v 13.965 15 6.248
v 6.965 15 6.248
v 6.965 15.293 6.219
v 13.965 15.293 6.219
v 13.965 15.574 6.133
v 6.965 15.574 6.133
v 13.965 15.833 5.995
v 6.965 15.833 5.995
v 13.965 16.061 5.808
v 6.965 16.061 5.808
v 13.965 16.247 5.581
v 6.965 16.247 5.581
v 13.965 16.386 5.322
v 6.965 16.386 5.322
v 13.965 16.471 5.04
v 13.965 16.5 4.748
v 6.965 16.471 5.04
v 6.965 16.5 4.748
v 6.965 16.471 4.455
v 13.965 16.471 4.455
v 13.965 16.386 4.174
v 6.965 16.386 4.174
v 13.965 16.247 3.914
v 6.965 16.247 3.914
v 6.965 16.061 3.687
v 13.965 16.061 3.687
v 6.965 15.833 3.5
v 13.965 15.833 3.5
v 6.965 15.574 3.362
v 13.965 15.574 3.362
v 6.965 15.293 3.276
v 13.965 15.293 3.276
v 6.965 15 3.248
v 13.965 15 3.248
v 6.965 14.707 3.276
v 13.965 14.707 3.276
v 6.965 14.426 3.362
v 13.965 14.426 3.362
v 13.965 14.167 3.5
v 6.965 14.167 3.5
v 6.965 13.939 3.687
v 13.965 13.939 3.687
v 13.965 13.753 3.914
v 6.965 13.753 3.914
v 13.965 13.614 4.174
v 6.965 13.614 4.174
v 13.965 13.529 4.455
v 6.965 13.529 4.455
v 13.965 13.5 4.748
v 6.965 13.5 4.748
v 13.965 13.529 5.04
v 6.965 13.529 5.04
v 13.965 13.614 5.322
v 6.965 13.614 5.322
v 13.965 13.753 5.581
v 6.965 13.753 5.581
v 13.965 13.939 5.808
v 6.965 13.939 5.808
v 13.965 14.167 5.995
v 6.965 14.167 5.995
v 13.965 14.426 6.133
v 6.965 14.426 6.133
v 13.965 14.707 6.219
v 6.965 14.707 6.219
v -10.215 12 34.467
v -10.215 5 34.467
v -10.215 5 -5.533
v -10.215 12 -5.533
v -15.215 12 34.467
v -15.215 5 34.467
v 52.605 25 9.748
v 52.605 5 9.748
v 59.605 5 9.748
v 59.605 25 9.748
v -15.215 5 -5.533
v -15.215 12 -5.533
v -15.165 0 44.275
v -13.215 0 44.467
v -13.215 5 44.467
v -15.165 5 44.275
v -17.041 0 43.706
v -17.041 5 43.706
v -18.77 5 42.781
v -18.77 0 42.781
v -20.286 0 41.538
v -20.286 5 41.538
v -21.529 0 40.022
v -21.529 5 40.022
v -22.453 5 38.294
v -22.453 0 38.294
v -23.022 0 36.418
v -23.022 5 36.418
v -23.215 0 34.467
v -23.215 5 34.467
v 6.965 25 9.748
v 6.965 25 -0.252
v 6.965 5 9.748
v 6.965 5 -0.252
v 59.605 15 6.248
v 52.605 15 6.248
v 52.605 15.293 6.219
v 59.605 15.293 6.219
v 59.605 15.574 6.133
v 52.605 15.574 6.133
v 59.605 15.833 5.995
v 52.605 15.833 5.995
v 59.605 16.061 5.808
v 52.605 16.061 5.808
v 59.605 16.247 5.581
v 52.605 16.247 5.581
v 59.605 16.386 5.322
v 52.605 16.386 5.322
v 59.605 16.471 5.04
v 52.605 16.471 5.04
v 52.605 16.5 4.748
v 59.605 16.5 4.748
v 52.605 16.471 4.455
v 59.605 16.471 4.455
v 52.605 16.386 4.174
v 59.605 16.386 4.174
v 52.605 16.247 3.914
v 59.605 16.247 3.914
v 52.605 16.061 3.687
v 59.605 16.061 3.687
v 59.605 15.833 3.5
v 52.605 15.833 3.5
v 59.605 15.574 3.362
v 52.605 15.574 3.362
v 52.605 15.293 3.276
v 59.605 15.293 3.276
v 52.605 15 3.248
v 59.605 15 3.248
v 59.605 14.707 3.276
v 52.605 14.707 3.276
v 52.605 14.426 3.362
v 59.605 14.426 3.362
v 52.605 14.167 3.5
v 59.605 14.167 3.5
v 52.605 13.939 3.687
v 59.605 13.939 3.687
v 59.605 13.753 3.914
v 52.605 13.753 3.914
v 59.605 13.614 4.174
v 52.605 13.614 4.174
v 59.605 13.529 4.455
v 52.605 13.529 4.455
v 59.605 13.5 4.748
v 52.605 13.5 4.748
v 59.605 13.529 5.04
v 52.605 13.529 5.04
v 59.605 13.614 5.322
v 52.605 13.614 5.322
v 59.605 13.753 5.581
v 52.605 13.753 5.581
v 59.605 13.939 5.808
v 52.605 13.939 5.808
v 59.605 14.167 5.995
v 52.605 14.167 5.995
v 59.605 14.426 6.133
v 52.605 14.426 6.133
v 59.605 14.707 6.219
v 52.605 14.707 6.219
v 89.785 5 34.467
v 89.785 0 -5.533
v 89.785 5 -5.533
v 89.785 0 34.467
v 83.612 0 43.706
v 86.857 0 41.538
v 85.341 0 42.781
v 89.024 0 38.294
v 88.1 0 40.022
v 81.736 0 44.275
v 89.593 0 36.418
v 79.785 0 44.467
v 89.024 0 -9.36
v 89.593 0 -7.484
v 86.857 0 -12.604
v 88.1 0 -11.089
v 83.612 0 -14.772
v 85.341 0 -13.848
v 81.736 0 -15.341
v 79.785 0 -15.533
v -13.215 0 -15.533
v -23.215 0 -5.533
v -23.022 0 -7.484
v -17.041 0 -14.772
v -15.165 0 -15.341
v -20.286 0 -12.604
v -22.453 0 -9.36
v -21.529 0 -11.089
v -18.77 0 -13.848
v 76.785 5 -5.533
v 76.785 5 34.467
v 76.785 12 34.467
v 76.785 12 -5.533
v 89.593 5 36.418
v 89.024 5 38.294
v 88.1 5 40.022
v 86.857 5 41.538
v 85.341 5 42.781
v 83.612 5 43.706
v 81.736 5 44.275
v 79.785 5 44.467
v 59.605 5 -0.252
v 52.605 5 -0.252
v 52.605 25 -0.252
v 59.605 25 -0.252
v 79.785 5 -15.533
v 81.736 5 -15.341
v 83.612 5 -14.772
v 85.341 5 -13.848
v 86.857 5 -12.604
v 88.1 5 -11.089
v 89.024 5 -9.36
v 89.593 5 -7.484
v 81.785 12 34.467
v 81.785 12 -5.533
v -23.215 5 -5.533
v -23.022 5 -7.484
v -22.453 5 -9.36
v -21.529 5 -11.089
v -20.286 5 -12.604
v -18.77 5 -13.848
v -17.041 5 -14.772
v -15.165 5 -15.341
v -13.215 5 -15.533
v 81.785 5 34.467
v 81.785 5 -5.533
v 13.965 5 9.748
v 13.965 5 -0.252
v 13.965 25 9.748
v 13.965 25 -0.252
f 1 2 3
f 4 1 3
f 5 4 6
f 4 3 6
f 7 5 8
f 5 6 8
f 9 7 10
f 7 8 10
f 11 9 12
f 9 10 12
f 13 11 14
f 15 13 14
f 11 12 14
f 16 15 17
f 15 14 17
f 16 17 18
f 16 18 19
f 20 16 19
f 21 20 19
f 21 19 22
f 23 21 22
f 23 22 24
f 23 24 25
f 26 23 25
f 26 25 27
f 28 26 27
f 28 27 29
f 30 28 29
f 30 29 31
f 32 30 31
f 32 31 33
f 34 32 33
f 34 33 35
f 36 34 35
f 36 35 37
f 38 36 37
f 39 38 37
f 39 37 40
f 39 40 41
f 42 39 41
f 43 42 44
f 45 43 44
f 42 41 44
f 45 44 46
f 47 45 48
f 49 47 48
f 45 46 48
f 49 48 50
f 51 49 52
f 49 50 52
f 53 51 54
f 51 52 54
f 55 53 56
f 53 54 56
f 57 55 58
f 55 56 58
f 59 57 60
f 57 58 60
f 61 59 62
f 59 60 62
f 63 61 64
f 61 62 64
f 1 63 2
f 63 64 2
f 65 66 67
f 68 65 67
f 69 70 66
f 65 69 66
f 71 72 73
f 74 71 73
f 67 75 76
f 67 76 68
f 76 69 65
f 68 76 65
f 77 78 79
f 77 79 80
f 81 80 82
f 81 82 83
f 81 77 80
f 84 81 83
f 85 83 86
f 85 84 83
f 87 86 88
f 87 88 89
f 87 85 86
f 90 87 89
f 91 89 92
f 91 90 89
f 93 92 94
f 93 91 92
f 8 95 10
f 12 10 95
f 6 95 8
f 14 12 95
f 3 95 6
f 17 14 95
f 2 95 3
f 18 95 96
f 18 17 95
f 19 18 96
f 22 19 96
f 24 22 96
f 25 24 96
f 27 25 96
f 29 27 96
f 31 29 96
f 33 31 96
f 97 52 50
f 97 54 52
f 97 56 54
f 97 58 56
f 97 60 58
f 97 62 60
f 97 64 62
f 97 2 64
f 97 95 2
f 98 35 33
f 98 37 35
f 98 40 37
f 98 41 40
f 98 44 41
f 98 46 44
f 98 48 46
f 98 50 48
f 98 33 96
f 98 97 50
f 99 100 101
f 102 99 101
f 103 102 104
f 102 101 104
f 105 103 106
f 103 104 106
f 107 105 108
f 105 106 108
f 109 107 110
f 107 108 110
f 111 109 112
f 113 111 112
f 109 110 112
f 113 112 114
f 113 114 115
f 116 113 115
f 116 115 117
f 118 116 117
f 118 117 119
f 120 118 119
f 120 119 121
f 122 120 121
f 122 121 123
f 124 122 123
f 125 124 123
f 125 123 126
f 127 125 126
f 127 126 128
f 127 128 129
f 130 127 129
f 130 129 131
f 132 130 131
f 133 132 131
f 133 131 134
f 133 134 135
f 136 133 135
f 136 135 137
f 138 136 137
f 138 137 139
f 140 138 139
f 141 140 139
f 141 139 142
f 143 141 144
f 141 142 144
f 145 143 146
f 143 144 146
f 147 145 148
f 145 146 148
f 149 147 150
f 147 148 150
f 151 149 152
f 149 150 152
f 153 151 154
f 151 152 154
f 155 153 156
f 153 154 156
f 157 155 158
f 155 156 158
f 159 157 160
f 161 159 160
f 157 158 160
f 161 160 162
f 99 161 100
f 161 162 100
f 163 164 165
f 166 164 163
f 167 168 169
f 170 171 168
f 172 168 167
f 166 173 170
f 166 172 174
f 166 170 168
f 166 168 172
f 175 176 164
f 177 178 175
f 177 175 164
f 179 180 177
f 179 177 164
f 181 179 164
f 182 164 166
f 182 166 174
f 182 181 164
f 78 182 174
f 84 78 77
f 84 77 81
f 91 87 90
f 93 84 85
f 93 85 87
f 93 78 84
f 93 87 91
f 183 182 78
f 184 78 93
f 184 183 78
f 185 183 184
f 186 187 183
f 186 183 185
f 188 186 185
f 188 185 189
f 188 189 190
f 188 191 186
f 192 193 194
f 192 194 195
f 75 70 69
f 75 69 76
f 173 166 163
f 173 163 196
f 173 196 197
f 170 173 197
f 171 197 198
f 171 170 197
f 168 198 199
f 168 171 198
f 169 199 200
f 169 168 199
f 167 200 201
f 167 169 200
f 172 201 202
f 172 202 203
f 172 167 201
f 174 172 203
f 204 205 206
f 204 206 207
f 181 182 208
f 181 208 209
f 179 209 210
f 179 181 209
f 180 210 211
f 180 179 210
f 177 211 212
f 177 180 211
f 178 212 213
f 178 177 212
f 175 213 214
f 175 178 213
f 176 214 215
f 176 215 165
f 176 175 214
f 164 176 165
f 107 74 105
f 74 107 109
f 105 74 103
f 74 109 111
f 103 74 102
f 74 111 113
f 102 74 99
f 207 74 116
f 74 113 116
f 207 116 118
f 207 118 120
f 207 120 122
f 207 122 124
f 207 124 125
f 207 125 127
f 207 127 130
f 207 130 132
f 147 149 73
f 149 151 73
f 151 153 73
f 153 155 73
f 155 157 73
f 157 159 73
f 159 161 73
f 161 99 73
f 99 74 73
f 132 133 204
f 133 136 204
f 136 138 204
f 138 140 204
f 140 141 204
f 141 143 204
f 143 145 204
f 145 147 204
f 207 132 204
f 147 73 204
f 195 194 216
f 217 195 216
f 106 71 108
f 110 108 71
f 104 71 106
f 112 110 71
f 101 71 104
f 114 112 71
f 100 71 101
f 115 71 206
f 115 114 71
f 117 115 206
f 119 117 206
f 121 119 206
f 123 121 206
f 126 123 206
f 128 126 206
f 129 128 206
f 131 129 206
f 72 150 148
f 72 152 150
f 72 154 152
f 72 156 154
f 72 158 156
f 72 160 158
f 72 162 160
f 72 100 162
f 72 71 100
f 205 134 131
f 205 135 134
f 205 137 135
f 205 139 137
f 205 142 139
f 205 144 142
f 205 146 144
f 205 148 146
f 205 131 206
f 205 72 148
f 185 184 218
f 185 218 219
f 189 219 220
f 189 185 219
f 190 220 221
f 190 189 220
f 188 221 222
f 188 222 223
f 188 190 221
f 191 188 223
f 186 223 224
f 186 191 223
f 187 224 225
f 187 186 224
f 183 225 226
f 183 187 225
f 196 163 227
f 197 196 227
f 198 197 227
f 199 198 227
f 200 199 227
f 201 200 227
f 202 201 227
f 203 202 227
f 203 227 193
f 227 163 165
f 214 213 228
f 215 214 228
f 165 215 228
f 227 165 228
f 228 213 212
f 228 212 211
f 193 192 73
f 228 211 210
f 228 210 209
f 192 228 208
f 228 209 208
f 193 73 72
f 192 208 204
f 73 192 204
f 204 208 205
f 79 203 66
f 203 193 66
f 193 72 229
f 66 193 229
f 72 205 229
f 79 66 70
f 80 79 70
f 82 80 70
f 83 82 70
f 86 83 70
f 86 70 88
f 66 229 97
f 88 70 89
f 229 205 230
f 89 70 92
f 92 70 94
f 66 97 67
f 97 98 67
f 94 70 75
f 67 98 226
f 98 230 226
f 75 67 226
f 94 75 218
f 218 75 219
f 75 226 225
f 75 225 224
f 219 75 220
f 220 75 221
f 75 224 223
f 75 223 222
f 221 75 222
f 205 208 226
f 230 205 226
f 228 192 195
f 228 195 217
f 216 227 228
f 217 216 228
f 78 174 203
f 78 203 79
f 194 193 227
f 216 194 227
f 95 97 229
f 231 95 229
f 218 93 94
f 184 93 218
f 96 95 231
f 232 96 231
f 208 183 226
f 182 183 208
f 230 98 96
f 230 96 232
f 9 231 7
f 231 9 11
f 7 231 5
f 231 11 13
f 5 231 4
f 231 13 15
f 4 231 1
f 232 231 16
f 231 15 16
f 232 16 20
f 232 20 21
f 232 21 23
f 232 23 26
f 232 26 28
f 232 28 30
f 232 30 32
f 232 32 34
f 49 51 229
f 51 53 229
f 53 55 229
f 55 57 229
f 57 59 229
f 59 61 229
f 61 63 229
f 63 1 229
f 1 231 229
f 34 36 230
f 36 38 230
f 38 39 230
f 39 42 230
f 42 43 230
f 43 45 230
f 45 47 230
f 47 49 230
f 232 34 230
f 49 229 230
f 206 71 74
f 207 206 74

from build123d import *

# Parameters (mm, degrees)
RESSALTO_EXTRUS_O1_DEPTH = 5
ESBO_O2_W                = 7
ESBO_O2_H                = 10
RESSALTO_EXTRUS_O2_DEPTH = 20
ESBO_O4_R                = 1.5
CORTE_EXTRUS_O1_DEPTH    = 98.269963506
ESBO_O5_W                = 5
ESBO_O5_H                = 40
RESSALTO_EXTRUS_O3_DEPTH = 7


with BuildPart() as part:
    # Esboço1 → Ressalto-extrusão1 (new body)
    with BuildSketch(Plane(origin=(0, 0, 0), x_dir=(1, 0, 0), z_dir=(0, 1, 0))):
        with BuildLine():
            Line((-13.214501511, 15.533232628), (79.785498489, 15.533232628))
            ThreePointArc((79.785498489, 15.533232628), (86.856566301, 12.60430044), (89.785498489, 5.533232628))
            Line((89.785498489, 5.533232628), (89.785498489, -34.466767372))
            ThreePointArc((89.785498489, -34.466767372), (86.856566301, -41.537835183), (79.785498489, -44.466767372))
            Line((79.785498489, -44.466767372), (-13.214501511, -44.466767372))
            ThreePointArc((-13.214501511, -44.466767372), (-20.285569322, -41.537835183), (-23.214501511, -34.466767372))
            Line((-23.214501511, -34.466767372), (-23.214501511, 5.533232628))
            ThreePointArc((-23.214501511, 5.533232628), (-20.285569322, 12.60430044), (-13.214501511, 15.533232628))
        make_face()
    extrude(amount=RESSALTO_EXTRUS_O1_DEPTH)

    # Esboço2 → Ressalto-extrusão2 (add)
    with BuildSketch(Plane(origin=(0, 5, 0), x_dir=(1, 0, 0), z_dir=(0, 1, 0))):
        with Locations((56.105498489, -4.747557162)):
            Rectangle(ESBO_O2_W, ESBO_O2_H)
        with Locations((10.465498489, -4.747557162)):
            Rectangle(ESBO_O2_W, ESBO_O2_H)
    extrude(amount=RESSALTO_EXTRUS_O2_DEPTH)

    # Esboço4 → Corte-extrusão1 (cut, through all)
    with BuildSketch(Plane.ZY.offset(-6.965498489)):
        with Locations((4.747557162, 15)):
            Circle(ESBO_O4_R)
    extrude(amount=-CORTE_EXTRUS_O1_DEPTH, mode=Mode.SUBTRACT)

    # Esboço5 → Ressalto-extrusão3 (add)
    with BuildSketch(Plane(origin=(0, 5, 0), x_dir=(1, 0, 0), z_dir=(0, 1, 0))):
        with Locations((-12.714501511, -14.466767372)):
            Rectangle(ESBO_O5_W, ESBO_O5_H)
        with Locations((79.285498489, -14.466767372)):
            Rectangle(ESBO_O5_W, ESBO_O5_H)
    extrude(amount=RESSALTO_EXTRUS_O3_DEPTH)


solid = part.part
